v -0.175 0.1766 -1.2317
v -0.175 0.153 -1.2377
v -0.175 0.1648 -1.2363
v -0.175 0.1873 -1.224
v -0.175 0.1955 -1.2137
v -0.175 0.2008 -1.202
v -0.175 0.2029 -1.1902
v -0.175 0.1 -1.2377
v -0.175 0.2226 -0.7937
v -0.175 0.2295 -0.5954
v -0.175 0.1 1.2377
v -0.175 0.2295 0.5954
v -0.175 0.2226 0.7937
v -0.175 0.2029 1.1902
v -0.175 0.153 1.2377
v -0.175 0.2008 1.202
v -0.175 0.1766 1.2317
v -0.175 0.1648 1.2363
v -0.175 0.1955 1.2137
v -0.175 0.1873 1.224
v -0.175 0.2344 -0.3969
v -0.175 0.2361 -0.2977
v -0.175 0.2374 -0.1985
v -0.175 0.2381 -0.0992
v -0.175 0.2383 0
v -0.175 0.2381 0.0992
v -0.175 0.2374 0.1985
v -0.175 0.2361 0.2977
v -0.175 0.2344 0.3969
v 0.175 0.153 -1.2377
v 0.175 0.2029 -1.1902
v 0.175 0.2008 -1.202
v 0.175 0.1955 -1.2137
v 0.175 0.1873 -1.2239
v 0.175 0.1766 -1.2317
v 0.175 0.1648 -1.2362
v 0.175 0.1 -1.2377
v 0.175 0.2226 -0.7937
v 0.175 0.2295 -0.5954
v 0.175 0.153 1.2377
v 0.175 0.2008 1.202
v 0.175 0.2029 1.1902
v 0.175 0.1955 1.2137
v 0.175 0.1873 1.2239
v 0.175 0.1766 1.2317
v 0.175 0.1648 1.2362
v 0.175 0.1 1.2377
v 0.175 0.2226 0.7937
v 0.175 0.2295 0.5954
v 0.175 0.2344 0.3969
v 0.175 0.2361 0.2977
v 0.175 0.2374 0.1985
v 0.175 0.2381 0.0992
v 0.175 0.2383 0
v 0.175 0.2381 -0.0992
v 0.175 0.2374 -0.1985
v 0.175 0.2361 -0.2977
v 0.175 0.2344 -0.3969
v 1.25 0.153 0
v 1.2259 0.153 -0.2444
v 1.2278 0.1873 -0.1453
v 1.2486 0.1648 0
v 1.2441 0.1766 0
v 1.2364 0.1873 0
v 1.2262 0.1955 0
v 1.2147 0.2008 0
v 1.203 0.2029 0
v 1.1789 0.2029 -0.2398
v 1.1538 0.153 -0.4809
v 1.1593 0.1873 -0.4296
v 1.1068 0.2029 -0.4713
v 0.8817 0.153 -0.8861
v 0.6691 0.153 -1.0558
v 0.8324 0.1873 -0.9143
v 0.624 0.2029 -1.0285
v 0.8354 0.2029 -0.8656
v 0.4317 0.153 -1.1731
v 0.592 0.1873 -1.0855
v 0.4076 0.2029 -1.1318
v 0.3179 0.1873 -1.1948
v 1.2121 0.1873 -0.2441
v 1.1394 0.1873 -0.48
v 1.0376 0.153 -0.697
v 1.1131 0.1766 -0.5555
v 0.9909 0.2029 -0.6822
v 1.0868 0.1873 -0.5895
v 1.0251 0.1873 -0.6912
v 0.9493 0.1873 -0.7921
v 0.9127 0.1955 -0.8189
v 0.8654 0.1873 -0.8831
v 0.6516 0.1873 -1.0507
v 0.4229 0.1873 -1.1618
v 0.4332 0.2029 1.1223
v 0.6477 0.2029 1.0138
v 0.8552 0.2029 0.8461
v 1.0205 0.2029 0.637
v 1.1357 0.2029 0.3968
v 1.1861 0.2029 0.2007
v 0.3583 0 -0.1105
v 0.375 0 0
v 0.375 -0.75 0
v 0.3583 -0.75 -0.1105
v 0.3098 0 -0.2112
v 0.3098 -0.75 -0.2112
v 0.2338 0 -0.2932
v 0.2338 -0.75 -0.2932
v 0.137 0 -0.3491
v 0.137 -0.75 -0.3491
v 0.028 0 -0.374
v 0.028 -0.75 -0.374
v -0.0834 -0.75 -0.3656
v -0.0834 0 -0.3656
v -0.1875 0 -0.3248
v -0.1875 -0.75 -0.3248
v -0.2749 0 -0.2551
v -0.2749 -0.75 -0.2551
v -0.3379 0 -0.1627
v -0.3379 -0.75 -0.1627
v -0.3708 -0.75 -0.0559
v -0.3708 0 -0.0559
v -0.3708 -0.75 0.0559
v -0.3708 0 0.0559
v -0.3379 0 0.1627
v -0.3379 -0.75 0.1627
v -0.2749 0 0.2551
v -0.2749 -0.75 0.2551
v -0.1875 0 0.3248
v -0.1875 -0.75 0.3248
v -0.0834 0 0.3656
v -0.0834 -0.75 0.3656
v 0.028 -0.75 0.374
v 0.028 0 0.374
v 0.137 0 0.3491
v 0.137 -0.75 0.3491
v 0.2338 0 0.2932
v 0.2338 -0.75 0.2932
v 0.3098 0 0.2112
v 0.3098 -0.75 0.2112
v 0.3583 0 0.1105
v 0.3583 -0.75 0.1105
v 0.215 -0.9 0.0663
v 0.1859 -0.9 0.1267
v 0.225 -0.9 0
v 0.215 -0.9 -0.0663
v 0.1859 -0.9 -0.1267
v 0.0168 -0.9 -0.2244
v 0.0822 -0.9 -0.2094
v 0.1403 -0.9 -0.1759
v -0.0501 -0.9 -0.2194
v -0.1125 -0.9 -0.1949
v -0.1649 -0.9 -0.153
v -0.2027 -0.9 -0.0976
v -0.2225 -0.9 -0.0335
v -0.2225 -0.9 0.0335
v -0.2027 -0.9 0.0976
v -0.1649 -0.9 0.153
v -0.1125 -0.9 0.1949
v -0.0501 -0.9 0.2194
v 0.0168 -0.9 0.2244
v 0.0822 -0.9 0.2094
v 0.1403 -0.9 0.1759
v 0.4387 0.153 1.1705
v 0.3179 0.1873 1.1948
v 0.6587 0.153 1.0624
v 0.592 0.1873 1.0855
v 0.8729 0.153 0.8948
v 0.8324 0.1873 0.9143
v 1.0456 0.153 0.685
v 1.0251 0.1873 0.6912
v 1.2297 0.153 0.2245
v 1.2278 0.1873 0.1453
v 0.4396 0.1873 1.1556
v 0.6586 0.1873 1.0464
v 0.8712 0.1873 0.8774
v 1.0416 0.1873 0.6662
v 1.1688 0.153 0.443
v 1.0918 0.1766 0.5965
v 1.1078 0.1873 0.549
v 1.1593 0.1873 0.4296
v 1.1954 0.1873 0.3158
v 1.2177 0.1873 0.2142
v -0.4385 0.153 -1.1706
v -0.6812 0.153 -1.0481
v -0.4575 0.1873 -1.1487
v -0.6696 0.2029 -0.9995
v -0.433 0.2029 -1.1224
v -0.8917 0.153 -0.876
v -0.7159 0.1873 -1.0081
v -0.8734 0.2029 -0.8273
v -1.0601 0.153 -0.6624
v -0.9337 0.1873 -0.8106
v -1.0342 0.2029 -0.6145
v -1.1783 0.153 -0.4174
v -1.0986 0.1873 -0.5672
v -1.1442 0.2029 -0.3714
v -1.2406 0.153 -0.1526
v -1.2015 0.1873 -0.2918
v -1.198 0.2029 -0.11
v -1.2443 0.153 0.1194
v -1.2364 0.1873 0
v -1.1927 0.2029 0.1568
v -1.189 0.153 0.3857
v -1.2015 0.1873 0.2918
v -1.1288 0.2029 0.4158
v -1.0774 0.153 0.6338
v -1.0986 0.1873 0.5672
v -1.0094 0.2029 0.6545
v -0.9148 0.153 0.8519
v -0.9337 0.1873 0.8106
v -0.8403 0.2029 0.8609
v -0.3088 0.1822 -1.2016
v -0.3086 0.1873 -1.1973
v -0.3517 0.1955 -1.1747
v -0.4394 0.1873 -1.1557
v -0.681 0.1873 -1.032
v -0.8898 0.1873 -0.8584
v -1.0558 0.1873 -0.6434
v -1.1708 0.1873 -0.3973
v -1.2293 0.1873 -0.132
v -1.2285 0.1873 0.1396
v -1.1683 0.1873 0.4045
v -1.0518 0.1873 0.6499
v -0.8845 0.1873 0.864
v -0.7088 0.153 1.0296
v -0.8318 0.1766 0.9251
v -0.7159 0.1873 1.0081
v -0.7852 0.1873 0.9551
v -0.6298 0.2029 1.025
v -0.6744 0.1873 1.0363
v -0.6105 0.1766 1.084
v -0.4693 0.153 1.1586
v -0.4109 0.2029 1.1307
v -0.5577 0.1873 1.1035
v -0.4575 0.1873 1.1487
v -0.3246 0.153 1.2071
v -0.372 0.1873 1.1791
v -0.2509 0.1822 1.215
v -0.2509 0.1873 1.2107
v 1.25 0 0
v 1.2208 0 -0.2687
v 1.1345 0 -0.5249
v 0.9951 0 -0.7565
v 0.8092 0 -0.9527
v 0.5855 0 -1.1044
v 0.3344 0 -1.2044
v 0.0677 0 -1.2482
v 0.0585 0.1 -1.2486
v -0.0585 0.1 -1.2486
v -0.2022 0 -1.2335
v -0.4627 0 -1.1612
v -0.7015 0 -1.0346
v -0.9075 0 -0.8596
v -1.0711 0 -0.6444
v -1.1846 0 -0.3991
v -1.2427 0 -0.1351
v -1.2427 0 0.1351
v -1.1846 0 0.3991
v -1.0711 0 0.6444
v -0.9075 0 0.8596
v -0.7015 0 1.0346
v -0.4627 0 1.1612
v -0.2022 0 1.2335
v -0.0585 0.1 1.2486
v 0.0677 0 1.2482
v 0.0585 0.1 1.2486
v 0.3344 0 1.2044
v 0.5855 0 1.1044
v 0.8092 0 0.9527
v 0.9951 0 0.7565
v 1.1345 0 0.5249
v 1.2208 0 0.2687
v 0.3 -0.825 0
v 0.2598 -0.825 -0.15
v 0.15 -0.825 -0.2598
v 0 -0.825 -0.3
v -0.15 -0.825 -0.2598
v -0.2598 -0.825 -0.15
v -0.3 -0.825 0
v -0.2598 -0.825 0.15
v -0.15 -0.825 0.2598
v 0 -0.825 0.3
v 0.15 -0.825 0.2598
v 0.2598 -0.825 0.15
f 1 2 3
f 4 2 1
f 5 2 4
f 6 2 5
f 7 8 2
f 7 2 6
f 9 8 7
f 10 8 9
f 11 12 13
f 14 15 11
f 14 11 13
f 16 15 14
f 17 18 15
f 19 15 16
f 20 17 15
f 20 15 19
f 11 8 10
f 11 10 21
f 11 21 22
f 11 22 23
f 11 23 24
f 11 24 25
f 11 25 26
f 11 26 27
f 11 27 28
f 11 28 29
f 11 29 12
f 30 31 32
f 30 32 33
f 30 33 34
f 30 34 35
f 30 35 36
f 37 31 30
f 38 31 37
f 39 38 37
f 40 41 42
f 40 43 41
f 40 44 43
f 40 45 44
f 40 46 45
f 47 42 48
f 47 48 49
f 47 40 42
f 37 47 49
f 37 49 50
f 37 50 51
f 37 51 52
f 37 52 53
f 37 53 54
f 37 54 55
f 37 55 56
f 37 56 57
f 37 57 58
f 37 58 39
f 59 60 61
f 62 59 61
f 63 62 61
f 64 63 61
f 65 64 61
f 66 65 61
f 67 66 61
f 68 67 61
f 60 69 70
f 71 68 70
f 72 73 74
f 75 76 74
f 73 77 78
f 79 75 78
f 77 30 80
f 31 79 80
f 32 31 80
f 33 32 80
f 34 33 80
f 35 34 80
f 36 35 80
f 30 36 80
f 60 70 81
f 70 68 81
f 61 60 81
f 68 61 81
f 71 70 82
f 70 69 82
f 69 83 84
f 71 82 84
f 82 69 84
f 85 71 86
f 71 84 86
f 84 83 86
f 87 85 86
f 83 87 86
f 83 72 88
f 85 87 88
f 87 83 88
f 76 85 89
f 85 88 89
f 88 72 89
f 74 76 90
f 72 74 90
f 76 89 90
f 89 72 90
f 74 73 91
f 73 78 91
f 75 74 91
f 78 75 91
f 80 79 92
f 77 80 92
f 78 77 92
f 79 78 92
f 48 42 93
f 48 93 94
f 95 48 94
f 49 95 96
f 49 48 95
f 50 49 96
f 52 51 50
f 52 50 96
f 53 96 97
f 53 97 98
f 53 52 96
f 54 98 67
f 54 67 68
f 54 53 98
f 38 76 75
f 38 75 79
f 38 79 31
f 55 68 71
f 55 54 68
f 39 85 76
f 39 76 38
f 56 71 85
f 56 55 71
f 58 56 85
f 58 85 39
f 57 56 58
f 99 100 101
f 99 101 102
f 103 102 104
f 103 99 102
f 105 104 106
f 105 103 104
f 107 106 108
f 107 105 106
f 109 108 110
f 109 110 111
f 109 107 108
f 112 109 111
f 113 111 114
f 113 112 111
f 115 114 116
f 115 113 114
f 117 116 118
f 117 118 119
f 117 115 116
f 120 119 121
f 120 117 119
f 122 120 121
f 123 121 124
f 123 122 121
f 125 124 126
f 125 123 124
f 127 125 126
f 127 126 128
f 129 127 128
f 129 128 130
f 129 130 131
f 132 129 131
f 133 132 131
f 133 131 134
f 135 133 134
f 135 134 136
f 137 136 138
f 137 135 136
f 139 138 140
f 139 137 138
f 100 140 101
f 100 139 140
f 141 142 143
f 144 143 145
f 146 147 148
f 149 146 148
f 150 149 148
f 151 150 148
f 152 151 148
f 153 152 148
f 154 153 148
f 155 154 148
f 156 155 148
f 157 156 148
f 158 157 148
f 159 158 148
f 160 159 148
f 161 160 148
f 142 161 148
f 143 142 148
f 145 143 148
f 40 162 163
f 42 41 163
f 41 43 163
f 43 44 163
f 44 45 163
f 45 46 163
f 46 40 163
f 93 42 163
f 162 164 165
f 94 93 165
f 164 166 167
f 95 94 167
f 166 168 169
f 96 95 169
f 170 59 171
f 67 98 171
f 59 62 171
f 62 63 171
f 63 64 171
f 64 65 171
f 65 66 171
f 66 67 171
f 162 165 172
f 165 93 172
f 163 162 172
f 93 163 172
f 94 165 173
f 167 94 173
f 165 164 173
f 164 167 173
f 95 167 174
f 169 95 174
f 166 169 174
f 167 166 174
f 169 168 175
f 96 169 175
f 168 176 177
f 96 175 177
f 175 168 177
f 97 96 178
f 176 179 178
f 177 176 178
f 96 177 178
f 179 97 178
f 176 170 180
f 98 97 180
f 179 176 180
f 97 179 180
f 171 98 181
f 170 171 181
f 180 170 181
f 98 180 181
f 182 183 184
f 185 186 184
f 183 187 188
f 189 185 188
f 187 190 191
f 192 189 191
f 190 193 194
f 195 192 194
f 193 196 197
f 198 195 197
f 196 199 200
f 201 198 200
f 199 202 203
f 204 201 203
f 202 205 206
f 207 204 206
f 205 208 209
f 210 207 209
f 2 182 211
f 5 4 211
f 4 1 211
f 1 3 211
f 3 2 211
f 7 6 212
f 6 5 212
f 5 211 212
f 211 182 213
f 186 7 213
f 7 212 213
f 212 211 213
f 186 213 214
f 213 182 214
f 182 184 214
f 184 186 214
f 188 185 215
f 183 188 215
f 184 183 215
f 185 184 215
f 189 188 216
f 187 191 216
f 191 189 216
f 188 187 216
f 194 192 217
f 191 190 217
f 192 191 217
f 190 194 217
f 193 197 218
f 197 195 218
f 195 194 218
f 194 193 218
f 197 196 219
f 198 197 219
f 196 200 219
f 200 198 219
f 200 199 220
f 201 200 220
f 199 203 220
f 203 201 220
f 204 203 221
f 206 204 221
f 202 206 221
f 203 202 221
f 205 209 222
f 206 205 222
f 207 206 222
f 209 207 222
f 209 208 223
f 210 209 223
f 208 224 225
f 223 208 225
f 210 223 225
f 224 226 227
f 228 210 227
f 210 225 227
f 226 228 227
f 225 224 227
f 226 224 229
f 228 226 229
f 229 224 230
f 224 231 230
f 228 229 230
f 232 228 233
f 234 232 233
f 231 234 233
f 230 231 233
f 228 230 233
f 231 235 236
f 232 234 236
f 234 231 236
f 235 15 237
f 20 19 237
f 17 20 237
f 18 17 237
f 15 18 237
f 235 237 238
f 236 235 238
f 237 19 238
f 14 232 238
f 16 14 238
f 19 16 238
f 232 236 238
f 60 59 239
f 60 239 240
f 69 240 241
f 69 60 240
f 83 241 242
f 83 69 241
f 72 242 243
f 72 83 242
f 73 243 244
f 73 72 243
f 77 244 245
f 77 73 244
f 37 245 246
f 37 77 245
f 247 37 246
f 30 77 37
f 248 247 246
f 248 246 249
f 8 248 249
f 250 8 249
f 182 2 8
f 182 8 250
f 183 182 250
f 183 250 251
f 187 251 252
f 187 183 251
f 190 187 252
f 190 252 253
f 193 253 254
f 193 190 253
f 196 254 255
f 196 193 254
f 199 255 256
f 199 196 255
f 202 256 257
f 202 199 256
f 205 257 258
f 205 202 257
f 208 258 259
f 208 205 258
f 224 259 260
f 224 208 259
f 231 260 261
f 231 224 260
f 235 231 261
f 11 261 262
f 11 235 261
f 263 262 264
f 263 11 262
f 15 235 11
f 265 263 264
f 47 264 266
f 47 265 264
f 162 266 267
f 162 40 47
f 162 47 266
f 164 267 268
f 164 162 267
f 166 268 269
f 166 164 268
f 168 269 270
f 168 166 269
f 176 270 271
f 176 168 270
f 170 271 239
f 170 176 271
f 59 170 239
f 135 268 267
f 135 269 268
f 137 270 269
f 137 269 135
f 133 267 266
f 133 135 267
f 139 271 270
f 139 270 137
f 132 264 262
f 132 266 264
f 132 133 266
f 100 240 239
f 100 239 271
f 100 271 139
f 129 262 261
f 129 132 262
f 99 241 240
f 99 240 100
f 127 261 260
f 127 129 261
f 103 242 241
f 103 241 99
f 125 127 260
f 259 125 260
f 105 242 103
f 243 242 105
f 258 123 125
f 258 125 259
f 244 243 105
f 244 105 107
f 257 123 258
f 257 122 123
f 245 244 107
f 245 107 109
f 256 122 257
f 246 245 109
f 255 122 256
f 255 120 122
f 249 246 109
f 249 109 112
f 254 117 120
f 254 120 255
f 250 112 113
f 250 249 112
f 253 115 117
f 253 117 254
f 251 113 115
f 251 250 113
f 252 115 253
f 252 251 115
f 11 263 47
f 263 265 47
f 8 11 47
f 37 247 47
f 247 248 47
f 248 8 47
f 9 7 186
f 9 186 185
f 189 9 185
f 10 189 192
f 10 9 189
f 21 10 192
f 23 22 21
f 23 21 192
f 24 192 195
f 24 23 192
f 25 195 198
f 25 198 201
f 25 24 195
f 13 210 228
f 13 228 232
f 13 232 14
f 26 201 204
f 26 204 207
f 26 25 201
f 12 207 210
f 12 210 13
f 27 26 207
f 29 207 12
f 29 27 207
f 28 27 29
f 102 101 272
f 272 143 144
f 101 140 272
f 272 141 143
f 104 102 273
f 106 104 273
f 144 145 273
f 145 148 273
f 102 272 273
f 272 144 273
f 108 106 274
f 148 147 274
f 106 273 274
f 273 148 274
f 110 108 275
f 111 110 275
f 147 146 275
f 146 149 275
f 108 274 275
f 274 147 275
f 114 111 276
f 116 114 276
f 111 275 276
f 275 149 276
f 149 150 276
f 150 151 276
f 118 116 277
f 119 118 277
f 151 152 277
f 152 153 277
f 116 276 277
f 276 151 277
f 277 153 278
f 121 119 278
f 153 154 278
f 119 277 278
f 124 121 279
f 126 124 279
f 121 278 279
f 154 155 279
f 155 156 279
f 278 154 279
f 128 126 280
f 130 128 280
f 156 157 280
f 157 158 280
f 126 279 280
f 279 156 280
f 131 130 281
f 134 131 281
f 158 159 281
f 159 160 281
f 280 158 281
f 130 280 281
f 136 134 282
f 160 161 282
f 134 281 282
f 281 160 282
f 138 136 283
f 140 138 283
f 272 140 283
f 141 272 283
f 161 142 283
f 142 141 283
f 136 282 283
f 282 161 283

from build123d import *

# Parameters (mm, degrees)
SKETCH2_R               = 0.375
BOSS_EXTRUDE2_DEPTH     = 0.9
FILLET1_R               = 0.05
CHAMFER2_SIZE           = 0.15
CUT_EXTRUDE1_DEPTH      = 2.2500001
CUT_EXTRUDE1_DEPTH_BACK = 2.2500001


with BuildPart() as part:
    # Sketch4 → Revolve1 (revolve)
    with BuildSketch(Plane.XY):
        with BuildLine():
            Line((0, 0), (1.25, 0))
            Line((1.25, 0), (1.25, 0.2))
            ThreePointArc((1.25, 0.2), (0.625305699, 0.229323151), (0, 0.239100722))
            Line((0, 0.239100722), (0, 0))
        make_face()
    revolve(axis=Axis((0, -848.356227188, 0), (0, 1, 0)))

    # Sketch2 → Boss-Extrude2 (add)
    with BuildSketch(Plane(origin=(0, 0, 0), x_dir=(1, 0, 0), z_dir=(0, 1, 0))):
        Circle(SKETCH2_R)
    extrude(amount=-BOSS_EXTRUDE2_DEPTH)

    # Fillet1
    fillet1_edges = [part.edges().sort_by_distance(p)[0] for p in [
        (-1.25, 0.2, 0),
    ]]
    fillet(fillet1_edges, radius=FILLET1_R)

    # Chamfer2
    chamfer2_edges = [part.edges().sort_by_distance(p)[0] for p in [
        (-0.375, -0.9, 0),
    ]]
    chamfer(chamfer2_edges, length=CHAMFER2_SIZE)

    # Sketch3 → Cut-Extrude1 (cut, two sides)
    with BuildSketch(Plane.XY) as cut_extrude1_sk:
        Polygon((-0.175, 0.35), (0, 0.35), (0.175, 0.35), (0.175, 0.1), (0, 0.1), (-0.175, 0.1), align=None)
    extrude(amount=CUT_EXTRUDE1_DEPTH, mode=Mode.SUBTRACT)
    extrude(cut_extrude1_sk.sketch, amount=-CUT_EXTRUDE1_DEPTH_BACK, mode=Mode.SUBTRACT)


solid = part.part
